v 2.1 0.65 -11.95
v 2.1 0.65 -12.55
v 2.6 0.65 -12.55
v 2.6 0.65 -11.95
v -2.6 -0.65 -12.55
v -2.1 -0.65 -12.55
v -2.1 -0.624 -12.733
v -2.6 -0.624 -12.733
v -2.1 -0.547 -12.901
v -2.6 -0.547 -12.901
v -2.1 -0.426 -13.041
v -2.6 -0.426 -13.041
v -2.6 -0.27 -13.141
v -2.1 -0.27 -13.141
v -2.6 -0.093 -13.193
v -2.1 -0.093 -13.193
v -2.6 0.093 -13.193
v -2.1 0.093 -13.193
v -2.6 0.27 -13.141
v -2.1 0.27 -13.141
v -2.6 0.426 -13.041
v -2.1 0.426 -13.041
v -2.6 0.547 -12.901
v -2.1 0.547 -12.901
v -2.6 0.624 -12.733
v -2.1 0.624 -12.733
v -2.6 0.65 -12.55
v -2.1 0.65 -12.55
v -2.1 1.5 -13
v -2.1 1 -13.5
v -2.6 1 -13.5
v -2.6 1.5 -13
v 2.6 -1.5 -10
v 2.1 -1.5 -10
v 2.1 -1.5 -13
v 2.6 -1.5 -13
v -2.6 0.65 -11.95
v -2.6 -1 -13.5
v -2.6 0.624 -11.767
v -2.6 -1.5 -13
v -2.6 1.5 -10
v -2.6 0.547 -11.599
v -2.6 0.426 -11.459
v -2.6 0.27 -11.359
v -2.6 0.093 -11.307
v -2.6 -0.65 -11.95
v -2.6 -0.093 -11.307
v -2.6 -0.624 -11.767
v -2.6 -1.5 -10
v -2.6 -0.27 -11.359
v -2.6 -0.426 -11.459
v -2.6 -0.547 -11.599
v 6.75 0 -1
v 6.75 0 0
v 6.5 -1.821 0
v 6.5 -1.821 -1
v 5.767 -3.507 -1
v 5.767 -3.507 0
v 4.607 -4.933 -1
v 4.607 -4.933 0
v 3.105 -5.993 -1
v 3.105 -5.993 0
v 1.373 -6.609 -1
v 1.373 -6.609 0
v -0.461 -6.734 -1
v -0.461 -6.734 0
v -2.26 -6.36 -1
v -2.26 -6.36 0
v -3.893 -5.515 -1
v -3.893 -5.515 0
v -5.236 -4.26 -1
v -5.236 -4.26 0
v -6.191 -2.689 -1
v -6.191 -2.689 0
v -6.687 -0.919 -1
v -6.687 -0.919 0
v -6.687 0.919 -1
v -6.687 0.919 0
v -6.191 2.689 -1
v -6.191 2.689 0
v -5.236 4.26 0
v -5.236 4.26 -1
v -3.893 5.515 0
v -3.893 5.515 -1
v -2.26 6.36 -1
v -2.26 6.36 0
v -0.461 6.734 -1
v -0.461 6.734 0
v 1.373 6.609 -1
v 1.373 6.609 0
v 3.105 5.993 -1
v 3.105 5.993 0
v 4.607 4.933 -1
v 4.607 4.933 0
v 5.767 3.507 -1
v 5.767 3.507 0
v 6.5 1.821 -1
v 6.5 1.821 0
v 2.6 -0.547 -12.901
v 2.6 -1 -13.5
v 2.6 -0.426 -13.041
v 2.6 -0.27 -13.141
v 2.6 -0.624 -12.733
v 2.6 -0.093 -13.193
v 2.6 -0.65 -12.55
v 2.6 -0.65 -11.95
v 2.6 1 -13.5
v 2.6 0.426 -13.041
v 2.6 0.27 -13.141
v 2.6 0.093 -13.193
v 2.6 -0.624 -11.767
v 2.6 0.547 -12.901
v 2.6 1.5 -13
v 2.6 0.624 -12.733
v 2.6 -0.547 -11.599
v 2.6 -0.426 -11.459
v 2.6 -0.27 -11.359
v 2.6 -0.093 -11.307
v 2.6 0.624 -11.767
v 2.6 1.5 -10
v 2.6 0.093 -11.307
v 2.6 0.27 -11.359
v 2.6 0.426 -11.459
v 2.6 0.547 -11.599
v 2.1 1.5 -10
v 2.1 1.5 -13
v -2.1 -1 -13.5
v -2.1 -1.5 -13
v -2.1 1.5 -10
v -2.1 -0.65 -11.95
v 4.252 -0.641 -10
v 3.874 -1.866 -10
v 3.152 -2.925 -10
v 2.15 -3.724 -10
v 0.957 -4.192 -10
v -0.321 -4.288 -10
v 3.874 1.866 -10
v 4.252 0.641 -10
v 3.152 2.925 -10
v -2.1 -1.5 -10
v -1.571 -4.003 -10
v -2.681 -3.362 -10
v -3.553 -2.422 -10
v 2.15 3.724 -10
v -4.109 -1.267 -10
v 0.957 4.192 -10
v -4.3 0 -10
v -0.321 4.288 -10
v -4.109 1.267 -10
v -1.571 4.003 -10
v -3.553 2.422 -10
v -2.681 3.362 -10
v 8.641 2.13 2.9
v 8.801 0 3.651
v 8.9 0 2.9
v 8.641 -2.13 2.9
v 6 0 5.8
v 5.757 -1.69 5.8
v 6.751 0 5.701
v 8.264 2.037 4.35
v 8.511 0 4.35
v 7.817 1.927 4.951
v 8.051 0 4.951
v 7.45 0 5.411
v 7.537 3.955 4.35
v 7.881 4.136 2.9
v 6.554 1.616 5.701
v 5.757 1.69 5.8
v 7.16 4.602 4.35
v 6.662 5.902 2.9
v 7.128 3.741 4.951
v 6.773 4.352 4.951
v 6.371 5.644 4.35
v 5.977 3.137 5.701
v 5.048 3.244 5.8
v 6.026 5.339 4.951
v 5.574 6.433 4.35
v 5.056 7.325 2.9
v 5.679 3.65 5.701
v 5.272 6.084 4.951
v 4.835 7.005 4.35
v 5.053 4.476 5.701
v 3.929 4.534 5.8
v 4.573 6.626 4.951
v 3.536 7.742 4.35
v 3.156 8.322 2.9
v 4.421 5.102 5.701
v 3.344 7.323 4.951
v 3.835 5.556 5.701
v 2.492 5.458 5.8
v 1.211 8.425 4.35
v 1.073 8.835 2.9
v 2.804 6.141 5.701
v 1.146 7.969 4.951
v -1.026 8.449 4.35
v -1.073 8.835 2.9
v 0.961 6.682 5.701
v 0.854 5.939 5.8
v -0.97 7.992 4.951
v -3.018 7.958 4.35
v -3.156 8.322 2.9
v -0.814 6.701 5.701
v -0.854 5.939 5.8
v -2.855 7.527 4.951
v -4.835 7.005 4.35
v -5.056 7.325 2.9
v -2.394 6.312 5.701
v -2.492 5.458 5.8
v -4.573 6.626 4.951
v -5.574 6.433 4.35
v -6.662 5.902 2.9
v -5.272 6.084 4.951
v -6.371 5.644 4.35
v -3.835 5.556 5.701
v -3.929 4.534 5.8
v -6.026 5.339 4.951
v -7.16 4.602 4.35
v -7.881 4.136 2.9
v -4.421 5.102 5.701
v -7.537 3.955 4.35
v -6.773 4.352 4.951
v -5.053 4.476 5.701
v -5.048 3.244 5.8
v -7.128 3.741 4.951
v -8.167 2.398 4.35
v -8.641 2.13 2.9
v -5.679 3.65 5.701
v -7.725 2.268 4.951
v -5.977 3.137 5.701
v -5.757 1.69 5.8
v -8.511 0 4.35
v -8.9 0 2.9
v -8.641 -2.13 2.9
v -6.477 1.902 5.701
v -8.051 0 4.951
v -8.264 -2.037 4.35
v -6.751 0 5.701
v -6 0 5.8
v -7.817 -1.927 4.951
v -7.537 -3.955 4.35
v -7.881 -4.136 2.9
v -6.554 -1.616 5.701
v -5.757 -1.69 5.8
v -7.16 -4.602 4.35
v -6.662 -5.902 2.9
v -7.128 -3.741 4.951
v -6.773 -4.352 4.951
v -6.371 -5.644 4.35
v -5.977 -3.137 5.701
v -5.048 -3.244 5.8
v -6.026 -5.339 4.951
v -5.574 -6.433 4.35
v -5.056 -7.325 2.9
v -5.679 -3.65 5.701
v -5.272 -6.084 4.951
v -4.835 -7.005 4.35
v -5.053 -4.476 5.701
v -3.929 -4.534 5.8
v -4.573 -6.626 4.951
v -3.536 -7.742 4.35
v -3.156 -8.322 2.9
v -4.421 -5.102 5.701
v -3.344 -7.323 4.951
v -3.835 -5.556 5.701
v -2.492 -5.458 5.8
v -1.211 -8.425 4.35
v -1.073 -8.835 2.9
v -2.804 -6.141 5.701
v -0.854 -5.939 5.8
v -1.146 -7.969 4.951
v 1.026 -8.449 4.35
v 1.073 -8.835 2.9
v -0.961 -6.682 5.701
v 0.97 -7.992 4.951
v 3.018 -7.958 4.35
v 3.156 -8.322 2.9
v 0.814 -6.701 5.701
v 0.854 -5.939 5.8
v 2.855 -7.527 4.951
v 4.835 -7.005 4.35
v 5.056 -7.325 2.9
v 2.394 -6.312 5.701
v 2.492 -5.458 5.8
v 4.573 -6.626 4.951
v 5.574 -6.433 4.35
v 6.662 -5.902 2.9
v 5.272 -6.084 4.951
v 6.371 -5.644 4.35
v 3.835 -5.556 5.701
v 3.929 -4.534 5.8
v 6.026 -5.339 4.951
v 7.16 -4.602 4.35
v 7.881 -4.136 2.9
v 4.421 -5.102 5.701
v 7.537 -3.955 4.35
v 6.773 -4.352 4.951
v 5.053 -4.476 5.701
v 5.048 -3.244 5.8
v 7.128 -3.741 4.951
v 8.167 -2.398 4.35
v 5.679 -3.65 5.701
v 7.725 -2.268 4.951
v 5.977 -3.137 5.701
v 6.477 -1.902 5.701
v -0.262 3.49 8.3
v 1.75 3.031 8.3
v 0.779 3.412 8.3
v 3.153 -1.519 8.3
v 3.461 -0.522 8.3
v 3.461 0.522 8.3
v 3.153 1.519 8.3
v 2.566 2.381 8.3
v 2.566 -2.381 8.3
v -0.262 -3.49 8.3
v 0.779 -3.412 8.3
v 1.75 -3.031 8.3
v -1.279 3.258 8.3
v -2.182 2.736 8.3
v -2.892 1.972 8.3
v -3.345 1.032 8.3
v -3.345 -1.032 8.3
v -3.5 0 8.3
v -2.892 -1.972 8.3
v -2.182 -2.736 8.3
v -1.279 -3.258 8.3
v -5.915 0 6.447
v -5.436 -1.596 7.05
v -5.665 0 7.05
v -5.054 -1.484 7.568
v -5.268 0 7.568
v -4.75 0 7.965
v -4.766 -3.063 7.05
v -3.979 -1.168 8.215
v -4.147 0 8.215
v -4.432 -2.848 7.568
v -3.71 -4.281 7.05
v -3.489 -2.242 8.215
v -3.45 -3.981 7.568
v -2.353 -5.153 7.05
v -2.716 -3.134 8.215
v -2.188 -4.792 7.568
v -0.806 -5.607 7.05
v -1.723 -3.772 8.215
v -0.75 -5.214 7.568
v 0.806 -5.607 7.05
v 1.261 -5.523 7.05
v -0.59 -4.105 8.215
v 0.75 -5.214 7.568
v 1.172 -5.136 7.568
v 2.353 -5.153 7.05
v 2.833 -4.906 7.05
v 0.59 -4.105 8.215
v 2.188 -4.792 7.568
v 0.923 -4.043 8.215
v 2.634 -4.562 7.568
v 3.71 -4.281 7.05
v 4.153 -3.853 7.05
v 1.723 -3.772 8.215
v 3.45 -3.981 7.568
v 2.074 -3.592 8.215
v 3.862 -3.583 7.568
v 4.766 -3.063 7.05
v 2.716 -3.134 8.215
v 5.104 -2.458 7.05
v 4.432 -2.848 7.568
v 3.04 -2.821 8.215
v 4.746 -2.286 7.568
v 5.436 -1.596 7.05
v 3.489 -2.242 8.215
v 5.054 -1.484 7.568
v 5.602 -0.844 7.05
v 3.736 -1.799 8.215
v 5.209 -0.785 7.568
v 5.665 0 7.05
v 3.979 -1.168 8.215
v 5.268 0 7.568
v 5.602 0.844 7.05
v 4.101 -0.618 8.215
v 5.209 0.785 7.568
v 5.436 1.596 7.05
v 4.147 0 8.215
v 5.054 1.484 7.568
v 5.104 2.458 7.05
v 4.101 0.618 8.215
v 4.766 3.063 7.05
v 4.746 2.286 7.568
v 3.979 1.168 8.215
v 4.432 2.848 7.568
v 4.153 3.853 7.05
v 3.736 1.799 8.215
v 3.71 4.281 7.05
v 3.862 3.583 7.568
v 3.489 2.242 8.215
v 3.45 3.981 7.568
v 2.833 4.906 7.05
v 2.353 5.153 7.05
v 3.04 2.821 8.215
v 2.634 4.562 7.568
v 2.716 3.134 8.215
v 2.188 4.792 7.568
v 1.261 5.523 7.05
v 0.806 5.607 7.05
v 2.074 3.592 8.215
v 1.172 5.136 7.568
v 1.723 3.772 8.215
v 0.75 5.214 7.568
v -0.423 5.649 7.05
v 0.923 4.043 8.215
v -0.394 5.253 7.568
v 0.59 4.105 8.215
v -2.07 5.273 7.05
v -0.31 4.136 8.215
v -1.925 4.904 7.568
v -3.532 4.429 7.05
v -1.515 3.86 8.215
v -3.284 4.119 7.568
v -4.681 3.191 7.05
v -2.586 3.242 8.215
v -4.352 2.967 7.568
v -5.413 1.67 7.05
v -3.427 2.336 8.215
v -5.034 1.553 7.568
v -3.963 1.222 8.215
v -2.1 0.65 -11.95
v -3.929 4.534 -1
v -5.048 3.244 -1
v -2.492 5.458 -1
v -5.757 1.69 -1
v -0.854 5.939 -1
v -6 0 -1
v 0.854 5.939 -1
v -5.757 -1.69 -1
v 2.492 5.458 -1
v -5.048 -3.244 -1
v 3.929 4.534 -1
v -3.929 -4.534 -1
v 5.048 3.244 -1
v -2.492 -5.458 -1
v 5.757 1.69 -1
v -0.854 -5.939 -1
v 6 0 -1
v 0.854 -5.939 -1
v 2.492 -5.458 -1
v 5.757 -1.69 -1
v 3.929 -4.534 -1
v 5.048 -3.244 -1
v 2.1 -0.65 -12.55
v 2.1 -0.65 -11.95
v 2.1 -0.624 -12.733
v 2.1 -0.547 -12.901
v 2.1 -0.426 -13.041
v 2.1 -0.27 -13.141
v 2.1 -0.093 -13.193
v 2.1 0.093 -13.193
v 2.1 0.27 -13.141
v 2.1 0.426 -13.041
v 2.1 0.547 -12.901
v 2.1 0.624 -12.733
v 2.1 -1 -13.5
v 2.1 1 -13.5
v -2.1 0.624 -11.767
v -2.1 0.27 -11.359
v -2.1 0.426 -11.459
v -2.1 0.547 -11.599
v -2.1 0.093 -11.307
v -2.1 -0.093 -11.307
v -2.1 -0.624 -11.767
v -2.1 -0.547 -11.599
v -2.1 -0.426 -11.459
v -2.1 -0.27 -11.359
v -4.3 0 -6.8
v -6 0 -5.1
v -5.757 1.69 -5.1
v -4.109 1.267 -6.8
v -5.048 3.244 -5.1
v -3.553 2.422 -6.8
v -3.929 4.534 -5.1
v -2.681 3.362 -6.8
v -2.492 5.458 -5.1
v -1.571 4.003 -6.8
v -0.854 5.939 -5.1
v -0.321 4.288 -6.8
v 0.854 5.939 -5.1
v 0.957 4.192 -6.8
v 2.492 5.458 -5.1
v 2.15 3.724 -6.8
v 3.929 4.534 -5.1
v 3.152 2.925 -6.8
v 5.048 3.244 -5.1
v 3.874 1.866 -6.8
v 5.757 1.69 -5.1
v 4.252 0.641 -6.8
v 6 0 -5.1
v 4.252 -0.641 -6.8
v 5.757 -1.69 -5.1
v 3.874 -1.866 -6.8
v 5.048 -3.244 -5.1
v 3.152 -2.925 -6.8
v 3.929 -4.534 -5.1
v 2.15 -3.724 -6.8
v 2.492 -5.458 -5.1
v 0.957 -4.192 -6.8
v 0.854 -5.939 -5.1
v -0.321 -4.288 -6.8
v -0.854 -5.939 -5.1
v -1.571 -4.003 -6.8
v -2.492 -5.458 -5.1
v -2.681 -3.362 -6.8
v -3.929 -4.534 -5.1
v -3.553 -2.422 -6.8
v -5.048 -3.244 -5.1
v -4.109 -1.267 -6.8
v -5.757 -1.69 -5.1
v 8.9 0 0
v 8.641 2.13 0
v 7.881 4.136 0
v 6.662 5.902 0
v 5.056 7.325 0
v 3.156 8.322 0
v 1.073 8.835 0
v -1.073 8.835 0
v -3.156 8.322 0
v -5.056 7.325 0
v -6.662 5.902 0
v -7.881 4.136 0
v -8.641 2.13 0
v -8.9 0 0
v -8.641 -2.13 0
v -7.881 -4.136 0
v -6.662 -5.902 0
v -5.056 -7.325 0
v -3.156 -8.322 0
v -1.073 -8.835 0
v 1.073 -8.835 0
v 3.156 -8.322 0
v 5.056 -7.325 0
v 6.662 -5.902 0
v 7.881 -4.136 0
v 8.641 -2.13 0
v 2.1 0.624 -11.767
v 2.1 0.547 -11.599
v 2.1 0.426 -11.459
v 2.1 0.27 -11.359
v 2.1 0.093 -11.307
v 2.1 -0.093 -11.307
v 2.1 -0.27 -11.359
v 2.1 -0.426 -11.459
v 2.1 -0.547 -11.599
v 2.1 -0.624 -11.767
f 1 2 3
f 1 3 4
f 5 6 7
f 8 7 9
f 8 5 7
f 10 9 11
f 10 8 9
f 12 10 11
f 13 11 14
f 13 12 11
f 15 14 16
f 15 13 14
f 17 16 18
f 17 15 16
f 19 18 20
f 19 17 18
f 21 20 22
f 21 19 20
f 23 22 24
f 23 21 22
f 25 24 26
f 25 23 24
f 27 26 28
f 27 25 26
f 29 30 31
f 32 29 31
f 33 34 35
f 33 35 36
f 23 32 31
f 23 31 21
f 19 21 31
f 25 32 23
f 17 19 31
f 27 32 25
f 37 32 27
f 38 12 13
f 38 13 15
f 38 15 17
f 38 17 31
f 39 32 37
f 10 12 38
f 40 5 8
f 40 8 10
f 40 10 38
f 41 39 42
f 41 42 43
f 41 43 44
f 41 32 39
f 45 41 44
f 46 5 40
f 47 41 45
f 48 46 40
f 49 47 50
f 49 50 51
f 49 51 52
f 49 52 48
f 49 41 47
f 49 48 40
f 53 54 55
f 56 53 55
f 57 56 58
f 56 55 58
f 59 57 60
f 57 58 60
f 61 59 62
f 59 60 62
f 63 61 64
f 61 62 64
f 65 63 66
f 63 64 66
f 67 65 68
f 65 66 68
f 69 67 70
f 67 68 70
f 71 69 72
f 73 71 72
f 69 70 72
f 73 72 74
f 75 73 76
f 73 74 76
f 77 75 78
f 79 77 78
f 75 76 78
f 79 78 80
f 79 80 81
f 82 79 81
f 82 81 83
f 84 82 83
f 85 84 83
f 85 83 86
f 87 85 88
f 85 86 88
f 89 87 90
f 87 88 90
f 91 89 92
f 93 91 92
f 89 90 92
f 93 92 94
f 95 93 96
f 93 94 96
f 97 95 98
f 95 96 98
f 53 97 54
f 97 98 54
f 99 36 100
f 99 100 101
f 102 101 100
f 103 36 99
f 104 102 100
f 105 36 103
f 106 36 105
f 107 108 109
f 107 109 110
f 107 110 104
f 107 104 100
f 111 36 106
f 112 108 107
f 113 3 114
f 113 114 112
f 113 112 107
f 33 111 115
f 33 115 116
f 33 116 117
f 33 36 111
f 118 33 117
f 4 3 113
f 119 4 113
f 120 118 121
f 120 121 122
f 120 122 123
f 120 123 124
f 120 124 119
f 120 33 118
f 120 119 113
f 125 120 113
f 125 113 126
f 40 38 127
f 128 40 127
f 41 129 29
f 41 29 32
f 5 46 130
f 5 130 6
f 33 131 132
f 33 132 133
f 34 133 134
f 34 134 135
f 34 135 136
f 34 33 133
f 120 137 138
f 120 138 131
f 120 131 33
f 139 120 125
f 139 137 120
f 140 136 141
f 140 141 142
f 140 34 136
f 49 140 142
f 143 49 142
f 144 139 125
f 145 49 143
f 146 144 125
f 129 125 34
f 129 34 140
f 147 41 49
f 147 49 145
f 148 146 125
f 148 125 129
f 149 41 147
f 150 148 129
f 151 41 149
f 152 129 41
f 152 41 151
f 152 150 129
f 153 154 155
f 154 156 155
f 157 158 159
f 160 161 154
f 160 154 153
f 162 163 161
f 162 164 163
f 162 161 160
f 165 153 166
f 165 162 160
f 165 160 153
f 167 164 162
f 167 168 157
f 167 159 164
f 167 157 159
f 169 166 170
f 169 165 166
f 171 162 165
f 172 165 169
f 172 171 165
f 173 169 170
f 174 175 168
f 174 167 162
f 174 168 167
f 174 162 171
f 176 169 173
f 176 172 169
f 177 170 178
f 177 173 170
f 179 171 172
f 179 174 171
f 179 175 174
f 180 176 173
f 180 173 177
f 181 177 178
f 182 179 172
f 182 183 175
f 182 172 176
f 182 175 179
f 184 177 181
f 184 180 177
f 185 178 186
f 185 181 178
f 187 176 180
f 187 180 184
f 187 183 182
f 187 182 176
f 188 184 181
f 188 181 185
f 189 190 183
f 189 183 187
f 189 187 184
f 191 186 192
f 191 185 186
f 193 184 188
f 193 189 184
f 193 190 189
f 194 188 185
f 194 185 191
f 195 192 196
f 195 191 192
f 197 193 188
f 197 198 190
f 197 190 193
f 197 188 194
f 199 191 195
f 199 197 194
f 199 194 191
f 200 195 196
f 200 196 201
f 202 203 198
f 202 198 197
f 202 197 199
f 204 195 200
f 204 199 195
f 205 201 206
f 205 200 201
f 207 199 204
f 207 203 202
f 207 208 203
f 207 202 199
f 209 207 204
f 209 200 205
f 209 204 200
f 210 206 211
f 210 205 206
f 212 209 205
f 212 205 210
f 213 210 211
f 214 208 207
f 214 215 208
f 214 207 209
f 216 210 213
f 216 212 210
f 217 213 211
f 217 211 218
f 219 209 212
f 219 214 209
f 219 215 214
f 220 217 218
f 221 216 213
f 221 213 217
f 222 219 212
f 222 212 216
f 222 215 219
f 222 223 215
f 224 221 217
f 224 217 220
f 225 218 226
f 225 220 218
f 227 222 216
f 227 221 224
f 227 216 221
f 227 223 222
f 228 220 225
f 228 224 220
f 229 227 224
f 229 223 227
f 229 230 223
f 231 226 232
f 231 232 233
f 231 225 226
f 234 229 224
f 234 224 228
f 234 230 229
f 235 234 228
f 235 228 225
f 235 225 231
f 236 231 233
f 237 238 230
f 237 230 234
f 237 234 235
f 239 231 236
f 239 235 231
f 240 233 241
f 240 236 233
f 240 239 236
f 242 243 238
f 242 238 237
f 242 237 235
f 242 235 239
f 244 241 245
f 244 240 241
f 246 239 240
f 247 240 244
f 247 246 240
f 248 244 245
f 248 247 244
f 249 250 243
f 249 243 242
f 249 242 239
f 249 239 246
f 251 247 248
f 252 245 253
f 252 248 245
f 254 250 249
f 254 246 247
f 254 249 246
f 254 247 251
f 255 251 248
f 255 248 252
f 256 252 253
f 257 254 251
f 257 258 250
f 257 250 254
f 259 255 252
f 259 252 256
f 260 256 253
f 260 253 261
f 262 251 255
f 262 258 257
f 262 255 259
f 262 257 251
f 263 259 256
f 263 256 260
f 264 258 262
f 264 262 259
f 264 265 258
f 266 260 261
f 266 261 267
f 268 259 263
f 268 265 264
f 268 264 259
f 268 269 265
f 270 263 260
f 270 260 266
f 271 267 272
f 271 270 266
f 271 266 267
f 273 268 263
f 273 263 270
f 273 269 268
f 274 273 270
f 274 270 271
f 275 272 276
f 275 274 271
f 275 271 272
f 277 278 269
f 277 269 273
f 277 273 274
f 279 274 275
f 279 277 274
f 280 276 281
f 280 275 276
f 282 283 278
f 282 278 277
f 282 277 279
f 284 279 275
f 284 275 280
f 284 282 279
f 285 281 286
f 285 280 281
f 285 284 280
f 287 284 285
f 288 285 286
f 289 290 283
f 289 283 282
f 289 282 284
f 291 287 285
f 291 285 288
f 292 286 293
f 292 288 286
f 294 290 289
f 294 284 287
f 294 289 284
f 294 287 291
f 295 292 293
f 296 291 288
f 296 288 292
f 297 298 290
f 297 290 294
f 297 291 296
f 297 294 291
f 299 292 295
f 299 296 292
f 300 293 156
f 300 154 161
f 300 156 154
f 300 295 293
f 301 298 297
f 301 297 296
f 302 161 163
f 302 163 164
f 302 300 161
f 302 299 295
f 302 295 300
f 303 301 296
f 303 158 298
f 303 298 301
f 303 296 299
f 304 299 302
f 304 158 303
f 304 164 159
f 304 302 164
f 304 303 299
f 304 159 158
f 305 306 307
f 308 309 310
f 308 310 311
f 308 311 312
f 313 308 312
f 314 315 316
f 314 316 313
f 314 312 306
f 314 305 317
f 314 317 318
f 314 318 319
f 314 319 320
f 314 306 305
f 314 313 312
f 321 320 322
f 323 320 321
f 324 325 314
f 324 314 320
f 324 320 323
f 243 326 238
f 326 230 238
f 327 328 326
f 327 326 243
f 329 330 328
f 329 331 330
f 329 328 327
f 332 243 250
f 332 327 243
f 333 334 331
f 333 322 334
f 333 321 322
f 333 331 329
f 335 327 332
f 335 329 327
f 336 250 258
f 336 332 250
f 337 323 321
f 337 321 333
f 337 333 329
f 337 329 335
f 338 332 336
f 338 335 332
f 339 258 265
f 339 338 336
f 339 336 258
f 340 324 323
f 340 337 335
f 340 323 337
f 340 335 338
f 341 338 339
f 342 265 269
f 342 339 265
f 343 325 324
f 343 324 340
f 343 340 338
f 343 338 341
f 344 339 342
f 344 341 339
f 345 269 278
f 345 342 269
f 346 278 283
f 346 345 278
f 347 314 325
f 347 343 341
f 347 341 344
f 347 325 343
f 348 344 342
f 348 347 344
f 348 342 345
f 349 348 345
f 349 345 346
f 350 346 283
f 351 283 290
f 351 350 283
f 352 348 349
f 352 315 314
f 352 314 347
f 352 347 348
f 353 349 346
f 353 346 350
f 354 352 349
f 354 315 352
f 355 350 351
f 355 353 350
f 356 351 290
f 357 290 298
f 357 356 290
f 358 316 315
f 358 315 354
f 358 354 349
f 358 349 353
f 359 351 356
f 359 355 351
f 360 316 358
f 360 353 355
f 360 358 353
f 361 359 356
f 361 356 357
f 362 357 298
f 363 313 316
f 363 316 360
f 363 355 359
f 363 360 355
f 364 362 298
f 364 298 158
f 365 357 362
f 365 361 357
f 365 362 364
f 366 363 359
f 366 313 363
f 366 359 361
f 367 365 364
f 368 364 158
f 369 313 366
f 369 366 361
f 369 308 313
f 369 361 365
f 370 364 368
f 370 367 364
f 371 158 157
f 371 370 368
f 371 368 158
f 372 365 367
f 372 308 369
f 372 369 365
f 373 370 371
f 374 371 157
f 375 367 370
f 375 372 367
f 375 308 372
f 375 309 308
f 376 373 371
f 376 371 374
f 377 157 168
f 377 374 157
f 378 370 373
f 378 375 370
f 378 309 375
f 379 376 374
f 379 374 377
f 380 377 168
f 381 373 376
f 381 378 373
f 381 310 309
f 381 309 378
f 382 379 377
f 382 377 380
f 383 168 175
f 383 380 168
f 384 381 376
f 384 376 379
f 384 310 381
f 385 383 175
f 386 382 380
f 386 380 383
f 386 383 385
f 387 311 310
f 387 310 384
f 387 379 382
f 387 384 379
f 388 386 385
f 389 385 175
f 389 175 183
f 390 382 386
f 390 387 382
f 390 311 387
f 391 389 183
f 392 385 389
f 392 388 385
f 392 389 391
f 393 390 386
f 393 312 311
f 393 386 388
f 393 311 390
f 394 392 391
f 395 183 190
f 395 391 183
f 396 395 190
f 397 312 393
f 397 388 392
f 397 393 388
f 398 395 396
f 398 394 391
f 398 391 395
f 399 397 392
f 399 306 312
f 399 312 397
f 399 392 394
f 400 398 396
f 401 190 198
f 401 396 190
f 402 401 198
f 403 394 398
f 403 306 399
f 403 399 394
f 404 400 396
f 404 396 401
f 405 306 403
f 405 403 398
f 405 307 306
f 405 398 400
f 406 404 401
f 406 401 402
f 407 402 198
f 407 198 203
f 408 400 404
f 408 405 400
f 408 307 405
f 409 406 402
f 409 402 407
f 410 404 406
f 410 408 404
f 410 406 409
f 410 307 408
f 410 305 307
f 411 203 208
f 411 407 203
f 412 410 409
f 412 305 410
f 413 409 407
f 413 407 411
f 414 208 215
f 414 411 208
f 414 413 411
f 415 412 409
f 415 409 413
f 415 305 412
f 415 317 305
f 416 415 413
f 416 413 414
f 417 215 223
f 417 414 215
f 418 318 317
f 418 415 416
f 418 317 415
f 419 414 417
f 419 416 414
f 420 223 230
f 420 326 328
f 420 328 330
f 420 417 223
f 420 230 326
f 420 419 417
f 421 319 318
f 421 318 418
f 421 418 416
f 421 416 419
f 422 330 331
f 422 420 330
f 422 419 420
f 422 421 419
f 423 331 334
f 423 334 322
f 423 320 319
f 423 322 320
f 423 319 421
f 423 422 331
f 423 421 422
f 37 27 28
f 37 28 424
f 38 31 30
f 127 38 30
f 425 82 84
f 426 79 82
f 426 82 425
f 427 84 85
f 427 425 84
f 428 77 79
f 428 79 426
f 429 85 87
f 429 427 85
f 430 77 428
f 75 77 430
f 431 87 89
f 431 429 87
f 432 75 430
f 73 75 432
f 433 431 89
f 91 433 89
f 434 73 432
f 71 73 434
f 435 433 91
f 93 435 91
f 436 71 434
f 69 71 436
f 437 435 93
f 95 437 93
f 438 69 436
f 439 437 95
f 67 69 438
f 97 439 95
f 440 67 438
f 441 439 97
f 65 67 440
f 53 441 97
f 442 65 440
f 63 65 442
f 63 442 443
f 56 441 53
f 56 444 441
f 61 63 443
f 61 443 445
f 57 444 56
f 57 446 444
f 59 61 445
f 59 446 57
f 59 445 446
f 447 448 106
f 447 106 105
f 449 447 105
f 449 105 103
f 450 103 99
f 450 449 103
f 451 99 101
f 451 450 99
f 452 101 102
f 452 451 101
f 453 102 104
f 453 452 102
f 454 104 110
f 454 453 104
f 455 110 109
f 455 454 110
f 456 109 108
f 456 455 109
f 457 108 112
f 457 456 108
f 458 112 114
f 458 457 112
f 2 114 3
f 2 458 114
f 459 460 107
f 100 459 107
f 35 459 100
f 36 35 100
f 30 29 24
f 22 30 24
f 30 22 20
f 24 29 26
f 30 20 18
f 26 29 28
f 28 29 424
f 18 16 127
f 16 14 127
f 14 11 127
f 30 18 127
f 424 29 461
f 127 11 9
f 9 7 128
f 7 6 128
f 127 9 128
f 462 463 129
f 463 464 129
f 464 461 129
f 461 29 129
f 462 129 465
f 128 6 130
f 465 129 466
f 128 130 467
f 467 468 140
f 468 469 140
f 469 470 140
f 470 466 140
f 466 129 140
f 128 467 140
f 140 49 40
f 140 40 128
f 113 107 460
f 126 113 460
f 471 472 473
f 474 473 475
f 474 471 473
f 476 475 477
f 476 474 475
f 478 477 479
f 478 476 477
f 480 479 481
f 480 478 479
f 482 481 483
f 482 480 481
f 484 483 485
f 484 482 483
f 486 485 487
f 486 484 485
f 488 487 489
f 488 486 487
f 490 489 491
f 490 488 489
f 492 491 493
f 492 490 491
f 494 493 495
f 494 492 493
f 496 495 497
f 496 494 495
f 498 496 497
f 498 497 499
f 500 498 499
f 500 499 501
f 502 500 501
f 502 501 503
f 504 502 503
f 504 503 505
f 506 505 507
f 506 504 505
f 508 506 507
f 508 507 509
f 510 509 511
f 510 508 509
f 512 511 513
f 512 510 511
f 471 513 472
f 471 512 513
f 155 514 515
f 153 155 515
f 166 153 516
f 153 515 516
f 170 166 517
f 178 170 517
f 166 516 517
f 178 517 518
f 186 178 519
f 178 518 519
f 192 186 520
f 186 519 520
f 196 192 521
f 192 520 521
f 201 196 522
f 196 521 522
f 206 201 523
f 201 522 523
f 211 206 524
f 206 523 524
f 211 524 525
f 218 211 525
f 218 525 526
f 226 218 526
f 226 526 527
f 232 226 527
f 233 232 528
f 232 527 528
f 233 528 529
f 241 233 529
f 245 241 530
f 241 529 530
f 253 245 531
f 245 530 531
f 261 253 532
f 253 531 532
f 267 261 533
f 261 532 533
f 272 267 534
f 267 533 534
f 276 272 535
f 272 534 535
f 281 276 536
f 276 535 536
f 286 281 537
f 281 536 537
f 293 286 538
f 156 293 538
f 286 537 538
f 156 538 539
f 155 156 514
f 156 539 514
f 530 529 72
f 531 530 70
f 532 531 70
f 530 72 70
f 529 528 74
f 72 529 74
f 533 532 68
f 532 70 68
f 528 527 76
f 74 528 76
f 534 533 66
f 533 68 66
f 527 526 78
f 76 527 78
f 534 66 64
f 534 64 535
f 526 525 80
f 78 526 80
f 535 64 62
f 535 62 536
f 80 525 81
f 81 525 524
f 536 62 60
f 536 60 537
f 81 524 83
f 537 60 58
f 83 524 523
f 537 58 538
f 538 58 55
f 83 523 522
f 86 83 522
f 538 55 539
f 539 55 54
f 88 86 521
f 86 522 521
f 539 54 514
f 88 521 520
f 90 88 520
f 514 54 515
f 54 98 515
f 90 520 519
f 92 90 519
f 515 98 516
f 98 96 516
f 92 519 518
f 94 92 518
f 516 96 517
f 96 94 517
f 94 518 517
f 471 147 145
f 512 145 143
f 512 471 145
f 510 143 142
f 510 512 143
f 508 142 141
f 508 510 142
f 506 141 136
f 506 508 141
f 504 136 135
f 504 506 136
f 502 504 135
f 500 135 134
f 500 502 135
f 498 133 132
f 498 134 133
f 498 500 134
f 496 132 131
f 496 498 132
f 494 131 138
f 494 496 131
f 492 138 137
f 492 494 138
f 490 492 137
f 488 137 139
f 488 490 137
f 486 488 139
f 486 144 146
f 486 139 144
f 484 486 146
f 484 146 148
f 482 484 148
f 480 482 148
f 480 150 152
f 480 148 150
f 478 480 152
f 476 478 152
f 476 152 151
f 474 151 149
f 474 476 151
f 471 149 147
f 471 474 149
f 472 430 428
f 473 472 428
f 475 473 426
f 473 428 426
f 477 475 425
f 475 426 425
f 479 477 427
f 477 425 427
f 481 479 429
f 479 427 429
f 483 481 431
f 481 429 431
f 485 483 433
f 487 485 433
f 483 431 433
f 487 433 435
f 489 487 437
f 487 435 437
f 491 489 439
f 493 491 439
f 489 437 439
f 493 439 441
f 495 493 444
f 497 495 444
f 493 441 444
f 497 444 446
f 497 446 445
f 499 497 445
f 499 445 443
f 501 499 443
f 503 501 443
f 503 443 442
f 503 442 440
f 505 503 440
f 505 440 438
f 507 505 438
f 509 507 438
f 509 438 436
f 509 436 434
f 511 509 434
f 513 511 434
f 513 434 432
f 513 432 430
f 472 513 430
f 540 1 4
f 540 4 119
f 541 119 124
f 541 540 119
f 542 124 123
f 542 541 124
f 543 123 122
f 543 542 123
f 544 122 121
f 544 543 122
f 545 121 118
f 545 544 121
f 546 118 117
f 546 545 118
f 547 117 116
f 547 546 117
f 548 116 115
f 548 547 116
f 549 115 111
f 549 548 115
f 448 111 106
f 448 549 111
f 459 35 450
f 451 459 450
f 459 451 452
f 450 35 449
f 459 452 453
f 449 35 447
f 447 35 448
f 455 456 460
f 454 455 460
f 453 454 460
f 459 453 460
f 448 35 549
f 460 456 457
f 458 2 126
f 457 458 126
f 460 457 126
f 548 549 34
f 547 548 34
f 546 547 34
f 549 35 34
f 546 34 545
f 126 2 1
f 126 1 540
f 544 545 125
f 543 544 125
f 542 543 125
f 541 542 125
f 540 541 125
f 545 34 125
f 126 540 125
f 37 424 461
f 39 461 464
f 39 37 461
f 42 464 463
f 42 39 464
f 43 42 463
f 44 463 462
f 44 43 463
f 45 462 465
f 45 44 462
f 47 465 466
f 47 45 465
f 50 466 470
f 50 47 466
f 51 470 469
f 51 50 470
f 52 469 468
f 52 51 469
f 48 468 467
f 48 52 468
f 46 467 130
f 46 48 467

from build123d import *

# Parameters (mm, degrees)
SKETCH_1_R          = 8.9
EXTRUDE_1_DEPTH     = 5.8
FILLET_2_R          = 2.9
SKETCH_2_R          = 6.75
EXTRUDE_2_DEPTH     = 1
SKETCH_3_R          = 6
EXTRUDE_3_DEPTH     = 7.5
SKETCH_4_R          = 4.3
EXTRUDE_4_DEPTH     = 1.5
CHAMFER_1_SIZE      = 3.4
EXTRUDE_5_DEPTH     = 3.5
CUT_EXTRUDE_1_DEPTH = 6.5
CHAMFER_2_SIZE      = 0.5
EXTRUDE_START       = 2.5
SKETCH_7_R          = 6
EXTRUDE_6_DEPTH     = 2.5
FILLET_3_R          = 2.5


# Some blends are built 0.0001 mm under size
with BuildPart() as part:
    # 草图1 → 凸台-拉伸1 (new body)
    with BuildSketch(Plane.XY):
        Circle(SKETCH_1_R)
    extrude(amount=EXTRUDE_1_DEPTH)

    # 圆角2
    fillet_2_edges = [part.edges().sort_by_distance(p)[0] for p in [
        (-8.9, 0, 5.8),
    ]]
    fillet(fillet_2_edges, radius=FILLET_2_R)

    # 草图2 → 凸台-拉伸2 (add)
    with BuildSketch(Plane(origin=(0, 0, 0), x_dir=(-1, 0, 0), z_dir=(0, 0, -1))):
        with Locations(Location((0, 0, 0), (0, 0, 180))):
            Circle(SKETCH_2_R)
    extrude(amount=EXTRUDE_2_DEPTH)

    # 草图3 → 凸台-拉伸3 (add)
    with BuildSketch(Plane(origin=(0, 0, -1), x_dir=(-1, 0, 0), z_dir=(0, 0, -1))):
        Circle(SKETCH_3_R)
    extrude(amount=EXTRUDE_3_DEPTH)

    # 草图4 → 凸台-拉伸4 (add)
    with BuildSketch(Plane(origin=(0, 0, -8.5), x_dir=(-1, 0, 0), z_dir=(0, 0, -1))):
        Circle(SKETCH_4_R)
    extrude(amount=EXTRUDE_4_DEPTH)

    # 倒角1
    # the kernel refuses this chamfer: 3.4 mm, written as the material it takes off along each edge
    with BuildSketch(Plane(origin=(0, 0, -8.5), x_dir=(-1, 0, 0), z_dir=(0, -1, 0))) as chamfer_1_piece_1_section:
        Polygon((6, -CHAMFER_1_SIZE), (6 - CHAMFER_1_SIZE, 0), (6, 0), align=None)
    chamfer_1_piece_1 = revolve(axis=Axis((0, 0, -8.5), (0, 0, -1)), mode=Mode.PRIVATE)
    chamfer_1_piece_1 = chamfer_1_piece_1 - Plane(origin=(0, 0, -5.94008013), x_dir=(-1, 0, 0), z_dir=(0, 0, 1)) * Cylinder(4.3, 24, mode=Mode.PRIVATE)
    add(chamfer_1_piece_1, mode=Mode.SUBTRACT)

    # 草图5 → 凸台-拉伸5 (add)
    with BuildSketch(Plane(origin=(0, 0, -10), x_dir=(-1, 0, 0), z_dir=(0, 0, -1))):
        Polygon((-2.6, 1.5), (-2.1, 1.5), (-2.1, 0), (-2.1, -1.5), (-2.6, -1.5), align=None)
        Polygon((2.1, 0), (2.1, 1.5), (2.6, 1.5), (2.6, -1.5), (2.1, -1.5), align=None)
    extrude(amount=EXTRUDE_5_DEPTH)

    # 草图6 → 切除-拉伸1 (cut)
    with BuildSketch(Plane.ZY.offset(2.6)):
        with BuildLine():
            Line((-12.55, 0.65), (-11.95, 0.65))
            ThreePointArc((-11.95, 0.65), (-11.3, 0), (-11.95, -0.65))
            Line((-11.95, -0.65), (-12.55, -0.65))
            ThreePointArc((-12.55, -0.65), (-13.2, 0), (-12.55, 0.65))
        make_face()
    extrude(amount=-CUT_EXTRUDE_1_DEPTH, mode=Mode.SUBTRACT)

    # 倒角2
    chamfer_2_edges = [part.edges().sort_by_distance(p)[0] for p in [
        (-2.35, -1.5, -13.5),
        (-2.35, 1.5, -13.5),
        (2.35, -1.5, -13.5),
        (2.35, 1.5, -13.5),
    ]]
    chamfer(chamfer_2_edges, length=CHAMFER_2_SIZE)

    # 草图7 → 凸台-拉伸6 (add)
    with BuildSketch(Plane.XY.offset(5.8).offset(EXTRUDE_START)):
        with Locations(Location((0, 0, 0), (0, 0, 180))):
            Circle(SKETCH_7_R)
    extrude(amount=-EXTRUDE_6_DEPTH)

    # 圆角3
    fillet_3_edges = [part.edges().sort_by_distance(p)[0] for p in [
        (6, 0, 8.3),
    ]]
    fillet(fillet_3_edges, radius=FILLET_3_R - 0.0001)  # a hair under: the kernel refuses the full size


solid = part.part
